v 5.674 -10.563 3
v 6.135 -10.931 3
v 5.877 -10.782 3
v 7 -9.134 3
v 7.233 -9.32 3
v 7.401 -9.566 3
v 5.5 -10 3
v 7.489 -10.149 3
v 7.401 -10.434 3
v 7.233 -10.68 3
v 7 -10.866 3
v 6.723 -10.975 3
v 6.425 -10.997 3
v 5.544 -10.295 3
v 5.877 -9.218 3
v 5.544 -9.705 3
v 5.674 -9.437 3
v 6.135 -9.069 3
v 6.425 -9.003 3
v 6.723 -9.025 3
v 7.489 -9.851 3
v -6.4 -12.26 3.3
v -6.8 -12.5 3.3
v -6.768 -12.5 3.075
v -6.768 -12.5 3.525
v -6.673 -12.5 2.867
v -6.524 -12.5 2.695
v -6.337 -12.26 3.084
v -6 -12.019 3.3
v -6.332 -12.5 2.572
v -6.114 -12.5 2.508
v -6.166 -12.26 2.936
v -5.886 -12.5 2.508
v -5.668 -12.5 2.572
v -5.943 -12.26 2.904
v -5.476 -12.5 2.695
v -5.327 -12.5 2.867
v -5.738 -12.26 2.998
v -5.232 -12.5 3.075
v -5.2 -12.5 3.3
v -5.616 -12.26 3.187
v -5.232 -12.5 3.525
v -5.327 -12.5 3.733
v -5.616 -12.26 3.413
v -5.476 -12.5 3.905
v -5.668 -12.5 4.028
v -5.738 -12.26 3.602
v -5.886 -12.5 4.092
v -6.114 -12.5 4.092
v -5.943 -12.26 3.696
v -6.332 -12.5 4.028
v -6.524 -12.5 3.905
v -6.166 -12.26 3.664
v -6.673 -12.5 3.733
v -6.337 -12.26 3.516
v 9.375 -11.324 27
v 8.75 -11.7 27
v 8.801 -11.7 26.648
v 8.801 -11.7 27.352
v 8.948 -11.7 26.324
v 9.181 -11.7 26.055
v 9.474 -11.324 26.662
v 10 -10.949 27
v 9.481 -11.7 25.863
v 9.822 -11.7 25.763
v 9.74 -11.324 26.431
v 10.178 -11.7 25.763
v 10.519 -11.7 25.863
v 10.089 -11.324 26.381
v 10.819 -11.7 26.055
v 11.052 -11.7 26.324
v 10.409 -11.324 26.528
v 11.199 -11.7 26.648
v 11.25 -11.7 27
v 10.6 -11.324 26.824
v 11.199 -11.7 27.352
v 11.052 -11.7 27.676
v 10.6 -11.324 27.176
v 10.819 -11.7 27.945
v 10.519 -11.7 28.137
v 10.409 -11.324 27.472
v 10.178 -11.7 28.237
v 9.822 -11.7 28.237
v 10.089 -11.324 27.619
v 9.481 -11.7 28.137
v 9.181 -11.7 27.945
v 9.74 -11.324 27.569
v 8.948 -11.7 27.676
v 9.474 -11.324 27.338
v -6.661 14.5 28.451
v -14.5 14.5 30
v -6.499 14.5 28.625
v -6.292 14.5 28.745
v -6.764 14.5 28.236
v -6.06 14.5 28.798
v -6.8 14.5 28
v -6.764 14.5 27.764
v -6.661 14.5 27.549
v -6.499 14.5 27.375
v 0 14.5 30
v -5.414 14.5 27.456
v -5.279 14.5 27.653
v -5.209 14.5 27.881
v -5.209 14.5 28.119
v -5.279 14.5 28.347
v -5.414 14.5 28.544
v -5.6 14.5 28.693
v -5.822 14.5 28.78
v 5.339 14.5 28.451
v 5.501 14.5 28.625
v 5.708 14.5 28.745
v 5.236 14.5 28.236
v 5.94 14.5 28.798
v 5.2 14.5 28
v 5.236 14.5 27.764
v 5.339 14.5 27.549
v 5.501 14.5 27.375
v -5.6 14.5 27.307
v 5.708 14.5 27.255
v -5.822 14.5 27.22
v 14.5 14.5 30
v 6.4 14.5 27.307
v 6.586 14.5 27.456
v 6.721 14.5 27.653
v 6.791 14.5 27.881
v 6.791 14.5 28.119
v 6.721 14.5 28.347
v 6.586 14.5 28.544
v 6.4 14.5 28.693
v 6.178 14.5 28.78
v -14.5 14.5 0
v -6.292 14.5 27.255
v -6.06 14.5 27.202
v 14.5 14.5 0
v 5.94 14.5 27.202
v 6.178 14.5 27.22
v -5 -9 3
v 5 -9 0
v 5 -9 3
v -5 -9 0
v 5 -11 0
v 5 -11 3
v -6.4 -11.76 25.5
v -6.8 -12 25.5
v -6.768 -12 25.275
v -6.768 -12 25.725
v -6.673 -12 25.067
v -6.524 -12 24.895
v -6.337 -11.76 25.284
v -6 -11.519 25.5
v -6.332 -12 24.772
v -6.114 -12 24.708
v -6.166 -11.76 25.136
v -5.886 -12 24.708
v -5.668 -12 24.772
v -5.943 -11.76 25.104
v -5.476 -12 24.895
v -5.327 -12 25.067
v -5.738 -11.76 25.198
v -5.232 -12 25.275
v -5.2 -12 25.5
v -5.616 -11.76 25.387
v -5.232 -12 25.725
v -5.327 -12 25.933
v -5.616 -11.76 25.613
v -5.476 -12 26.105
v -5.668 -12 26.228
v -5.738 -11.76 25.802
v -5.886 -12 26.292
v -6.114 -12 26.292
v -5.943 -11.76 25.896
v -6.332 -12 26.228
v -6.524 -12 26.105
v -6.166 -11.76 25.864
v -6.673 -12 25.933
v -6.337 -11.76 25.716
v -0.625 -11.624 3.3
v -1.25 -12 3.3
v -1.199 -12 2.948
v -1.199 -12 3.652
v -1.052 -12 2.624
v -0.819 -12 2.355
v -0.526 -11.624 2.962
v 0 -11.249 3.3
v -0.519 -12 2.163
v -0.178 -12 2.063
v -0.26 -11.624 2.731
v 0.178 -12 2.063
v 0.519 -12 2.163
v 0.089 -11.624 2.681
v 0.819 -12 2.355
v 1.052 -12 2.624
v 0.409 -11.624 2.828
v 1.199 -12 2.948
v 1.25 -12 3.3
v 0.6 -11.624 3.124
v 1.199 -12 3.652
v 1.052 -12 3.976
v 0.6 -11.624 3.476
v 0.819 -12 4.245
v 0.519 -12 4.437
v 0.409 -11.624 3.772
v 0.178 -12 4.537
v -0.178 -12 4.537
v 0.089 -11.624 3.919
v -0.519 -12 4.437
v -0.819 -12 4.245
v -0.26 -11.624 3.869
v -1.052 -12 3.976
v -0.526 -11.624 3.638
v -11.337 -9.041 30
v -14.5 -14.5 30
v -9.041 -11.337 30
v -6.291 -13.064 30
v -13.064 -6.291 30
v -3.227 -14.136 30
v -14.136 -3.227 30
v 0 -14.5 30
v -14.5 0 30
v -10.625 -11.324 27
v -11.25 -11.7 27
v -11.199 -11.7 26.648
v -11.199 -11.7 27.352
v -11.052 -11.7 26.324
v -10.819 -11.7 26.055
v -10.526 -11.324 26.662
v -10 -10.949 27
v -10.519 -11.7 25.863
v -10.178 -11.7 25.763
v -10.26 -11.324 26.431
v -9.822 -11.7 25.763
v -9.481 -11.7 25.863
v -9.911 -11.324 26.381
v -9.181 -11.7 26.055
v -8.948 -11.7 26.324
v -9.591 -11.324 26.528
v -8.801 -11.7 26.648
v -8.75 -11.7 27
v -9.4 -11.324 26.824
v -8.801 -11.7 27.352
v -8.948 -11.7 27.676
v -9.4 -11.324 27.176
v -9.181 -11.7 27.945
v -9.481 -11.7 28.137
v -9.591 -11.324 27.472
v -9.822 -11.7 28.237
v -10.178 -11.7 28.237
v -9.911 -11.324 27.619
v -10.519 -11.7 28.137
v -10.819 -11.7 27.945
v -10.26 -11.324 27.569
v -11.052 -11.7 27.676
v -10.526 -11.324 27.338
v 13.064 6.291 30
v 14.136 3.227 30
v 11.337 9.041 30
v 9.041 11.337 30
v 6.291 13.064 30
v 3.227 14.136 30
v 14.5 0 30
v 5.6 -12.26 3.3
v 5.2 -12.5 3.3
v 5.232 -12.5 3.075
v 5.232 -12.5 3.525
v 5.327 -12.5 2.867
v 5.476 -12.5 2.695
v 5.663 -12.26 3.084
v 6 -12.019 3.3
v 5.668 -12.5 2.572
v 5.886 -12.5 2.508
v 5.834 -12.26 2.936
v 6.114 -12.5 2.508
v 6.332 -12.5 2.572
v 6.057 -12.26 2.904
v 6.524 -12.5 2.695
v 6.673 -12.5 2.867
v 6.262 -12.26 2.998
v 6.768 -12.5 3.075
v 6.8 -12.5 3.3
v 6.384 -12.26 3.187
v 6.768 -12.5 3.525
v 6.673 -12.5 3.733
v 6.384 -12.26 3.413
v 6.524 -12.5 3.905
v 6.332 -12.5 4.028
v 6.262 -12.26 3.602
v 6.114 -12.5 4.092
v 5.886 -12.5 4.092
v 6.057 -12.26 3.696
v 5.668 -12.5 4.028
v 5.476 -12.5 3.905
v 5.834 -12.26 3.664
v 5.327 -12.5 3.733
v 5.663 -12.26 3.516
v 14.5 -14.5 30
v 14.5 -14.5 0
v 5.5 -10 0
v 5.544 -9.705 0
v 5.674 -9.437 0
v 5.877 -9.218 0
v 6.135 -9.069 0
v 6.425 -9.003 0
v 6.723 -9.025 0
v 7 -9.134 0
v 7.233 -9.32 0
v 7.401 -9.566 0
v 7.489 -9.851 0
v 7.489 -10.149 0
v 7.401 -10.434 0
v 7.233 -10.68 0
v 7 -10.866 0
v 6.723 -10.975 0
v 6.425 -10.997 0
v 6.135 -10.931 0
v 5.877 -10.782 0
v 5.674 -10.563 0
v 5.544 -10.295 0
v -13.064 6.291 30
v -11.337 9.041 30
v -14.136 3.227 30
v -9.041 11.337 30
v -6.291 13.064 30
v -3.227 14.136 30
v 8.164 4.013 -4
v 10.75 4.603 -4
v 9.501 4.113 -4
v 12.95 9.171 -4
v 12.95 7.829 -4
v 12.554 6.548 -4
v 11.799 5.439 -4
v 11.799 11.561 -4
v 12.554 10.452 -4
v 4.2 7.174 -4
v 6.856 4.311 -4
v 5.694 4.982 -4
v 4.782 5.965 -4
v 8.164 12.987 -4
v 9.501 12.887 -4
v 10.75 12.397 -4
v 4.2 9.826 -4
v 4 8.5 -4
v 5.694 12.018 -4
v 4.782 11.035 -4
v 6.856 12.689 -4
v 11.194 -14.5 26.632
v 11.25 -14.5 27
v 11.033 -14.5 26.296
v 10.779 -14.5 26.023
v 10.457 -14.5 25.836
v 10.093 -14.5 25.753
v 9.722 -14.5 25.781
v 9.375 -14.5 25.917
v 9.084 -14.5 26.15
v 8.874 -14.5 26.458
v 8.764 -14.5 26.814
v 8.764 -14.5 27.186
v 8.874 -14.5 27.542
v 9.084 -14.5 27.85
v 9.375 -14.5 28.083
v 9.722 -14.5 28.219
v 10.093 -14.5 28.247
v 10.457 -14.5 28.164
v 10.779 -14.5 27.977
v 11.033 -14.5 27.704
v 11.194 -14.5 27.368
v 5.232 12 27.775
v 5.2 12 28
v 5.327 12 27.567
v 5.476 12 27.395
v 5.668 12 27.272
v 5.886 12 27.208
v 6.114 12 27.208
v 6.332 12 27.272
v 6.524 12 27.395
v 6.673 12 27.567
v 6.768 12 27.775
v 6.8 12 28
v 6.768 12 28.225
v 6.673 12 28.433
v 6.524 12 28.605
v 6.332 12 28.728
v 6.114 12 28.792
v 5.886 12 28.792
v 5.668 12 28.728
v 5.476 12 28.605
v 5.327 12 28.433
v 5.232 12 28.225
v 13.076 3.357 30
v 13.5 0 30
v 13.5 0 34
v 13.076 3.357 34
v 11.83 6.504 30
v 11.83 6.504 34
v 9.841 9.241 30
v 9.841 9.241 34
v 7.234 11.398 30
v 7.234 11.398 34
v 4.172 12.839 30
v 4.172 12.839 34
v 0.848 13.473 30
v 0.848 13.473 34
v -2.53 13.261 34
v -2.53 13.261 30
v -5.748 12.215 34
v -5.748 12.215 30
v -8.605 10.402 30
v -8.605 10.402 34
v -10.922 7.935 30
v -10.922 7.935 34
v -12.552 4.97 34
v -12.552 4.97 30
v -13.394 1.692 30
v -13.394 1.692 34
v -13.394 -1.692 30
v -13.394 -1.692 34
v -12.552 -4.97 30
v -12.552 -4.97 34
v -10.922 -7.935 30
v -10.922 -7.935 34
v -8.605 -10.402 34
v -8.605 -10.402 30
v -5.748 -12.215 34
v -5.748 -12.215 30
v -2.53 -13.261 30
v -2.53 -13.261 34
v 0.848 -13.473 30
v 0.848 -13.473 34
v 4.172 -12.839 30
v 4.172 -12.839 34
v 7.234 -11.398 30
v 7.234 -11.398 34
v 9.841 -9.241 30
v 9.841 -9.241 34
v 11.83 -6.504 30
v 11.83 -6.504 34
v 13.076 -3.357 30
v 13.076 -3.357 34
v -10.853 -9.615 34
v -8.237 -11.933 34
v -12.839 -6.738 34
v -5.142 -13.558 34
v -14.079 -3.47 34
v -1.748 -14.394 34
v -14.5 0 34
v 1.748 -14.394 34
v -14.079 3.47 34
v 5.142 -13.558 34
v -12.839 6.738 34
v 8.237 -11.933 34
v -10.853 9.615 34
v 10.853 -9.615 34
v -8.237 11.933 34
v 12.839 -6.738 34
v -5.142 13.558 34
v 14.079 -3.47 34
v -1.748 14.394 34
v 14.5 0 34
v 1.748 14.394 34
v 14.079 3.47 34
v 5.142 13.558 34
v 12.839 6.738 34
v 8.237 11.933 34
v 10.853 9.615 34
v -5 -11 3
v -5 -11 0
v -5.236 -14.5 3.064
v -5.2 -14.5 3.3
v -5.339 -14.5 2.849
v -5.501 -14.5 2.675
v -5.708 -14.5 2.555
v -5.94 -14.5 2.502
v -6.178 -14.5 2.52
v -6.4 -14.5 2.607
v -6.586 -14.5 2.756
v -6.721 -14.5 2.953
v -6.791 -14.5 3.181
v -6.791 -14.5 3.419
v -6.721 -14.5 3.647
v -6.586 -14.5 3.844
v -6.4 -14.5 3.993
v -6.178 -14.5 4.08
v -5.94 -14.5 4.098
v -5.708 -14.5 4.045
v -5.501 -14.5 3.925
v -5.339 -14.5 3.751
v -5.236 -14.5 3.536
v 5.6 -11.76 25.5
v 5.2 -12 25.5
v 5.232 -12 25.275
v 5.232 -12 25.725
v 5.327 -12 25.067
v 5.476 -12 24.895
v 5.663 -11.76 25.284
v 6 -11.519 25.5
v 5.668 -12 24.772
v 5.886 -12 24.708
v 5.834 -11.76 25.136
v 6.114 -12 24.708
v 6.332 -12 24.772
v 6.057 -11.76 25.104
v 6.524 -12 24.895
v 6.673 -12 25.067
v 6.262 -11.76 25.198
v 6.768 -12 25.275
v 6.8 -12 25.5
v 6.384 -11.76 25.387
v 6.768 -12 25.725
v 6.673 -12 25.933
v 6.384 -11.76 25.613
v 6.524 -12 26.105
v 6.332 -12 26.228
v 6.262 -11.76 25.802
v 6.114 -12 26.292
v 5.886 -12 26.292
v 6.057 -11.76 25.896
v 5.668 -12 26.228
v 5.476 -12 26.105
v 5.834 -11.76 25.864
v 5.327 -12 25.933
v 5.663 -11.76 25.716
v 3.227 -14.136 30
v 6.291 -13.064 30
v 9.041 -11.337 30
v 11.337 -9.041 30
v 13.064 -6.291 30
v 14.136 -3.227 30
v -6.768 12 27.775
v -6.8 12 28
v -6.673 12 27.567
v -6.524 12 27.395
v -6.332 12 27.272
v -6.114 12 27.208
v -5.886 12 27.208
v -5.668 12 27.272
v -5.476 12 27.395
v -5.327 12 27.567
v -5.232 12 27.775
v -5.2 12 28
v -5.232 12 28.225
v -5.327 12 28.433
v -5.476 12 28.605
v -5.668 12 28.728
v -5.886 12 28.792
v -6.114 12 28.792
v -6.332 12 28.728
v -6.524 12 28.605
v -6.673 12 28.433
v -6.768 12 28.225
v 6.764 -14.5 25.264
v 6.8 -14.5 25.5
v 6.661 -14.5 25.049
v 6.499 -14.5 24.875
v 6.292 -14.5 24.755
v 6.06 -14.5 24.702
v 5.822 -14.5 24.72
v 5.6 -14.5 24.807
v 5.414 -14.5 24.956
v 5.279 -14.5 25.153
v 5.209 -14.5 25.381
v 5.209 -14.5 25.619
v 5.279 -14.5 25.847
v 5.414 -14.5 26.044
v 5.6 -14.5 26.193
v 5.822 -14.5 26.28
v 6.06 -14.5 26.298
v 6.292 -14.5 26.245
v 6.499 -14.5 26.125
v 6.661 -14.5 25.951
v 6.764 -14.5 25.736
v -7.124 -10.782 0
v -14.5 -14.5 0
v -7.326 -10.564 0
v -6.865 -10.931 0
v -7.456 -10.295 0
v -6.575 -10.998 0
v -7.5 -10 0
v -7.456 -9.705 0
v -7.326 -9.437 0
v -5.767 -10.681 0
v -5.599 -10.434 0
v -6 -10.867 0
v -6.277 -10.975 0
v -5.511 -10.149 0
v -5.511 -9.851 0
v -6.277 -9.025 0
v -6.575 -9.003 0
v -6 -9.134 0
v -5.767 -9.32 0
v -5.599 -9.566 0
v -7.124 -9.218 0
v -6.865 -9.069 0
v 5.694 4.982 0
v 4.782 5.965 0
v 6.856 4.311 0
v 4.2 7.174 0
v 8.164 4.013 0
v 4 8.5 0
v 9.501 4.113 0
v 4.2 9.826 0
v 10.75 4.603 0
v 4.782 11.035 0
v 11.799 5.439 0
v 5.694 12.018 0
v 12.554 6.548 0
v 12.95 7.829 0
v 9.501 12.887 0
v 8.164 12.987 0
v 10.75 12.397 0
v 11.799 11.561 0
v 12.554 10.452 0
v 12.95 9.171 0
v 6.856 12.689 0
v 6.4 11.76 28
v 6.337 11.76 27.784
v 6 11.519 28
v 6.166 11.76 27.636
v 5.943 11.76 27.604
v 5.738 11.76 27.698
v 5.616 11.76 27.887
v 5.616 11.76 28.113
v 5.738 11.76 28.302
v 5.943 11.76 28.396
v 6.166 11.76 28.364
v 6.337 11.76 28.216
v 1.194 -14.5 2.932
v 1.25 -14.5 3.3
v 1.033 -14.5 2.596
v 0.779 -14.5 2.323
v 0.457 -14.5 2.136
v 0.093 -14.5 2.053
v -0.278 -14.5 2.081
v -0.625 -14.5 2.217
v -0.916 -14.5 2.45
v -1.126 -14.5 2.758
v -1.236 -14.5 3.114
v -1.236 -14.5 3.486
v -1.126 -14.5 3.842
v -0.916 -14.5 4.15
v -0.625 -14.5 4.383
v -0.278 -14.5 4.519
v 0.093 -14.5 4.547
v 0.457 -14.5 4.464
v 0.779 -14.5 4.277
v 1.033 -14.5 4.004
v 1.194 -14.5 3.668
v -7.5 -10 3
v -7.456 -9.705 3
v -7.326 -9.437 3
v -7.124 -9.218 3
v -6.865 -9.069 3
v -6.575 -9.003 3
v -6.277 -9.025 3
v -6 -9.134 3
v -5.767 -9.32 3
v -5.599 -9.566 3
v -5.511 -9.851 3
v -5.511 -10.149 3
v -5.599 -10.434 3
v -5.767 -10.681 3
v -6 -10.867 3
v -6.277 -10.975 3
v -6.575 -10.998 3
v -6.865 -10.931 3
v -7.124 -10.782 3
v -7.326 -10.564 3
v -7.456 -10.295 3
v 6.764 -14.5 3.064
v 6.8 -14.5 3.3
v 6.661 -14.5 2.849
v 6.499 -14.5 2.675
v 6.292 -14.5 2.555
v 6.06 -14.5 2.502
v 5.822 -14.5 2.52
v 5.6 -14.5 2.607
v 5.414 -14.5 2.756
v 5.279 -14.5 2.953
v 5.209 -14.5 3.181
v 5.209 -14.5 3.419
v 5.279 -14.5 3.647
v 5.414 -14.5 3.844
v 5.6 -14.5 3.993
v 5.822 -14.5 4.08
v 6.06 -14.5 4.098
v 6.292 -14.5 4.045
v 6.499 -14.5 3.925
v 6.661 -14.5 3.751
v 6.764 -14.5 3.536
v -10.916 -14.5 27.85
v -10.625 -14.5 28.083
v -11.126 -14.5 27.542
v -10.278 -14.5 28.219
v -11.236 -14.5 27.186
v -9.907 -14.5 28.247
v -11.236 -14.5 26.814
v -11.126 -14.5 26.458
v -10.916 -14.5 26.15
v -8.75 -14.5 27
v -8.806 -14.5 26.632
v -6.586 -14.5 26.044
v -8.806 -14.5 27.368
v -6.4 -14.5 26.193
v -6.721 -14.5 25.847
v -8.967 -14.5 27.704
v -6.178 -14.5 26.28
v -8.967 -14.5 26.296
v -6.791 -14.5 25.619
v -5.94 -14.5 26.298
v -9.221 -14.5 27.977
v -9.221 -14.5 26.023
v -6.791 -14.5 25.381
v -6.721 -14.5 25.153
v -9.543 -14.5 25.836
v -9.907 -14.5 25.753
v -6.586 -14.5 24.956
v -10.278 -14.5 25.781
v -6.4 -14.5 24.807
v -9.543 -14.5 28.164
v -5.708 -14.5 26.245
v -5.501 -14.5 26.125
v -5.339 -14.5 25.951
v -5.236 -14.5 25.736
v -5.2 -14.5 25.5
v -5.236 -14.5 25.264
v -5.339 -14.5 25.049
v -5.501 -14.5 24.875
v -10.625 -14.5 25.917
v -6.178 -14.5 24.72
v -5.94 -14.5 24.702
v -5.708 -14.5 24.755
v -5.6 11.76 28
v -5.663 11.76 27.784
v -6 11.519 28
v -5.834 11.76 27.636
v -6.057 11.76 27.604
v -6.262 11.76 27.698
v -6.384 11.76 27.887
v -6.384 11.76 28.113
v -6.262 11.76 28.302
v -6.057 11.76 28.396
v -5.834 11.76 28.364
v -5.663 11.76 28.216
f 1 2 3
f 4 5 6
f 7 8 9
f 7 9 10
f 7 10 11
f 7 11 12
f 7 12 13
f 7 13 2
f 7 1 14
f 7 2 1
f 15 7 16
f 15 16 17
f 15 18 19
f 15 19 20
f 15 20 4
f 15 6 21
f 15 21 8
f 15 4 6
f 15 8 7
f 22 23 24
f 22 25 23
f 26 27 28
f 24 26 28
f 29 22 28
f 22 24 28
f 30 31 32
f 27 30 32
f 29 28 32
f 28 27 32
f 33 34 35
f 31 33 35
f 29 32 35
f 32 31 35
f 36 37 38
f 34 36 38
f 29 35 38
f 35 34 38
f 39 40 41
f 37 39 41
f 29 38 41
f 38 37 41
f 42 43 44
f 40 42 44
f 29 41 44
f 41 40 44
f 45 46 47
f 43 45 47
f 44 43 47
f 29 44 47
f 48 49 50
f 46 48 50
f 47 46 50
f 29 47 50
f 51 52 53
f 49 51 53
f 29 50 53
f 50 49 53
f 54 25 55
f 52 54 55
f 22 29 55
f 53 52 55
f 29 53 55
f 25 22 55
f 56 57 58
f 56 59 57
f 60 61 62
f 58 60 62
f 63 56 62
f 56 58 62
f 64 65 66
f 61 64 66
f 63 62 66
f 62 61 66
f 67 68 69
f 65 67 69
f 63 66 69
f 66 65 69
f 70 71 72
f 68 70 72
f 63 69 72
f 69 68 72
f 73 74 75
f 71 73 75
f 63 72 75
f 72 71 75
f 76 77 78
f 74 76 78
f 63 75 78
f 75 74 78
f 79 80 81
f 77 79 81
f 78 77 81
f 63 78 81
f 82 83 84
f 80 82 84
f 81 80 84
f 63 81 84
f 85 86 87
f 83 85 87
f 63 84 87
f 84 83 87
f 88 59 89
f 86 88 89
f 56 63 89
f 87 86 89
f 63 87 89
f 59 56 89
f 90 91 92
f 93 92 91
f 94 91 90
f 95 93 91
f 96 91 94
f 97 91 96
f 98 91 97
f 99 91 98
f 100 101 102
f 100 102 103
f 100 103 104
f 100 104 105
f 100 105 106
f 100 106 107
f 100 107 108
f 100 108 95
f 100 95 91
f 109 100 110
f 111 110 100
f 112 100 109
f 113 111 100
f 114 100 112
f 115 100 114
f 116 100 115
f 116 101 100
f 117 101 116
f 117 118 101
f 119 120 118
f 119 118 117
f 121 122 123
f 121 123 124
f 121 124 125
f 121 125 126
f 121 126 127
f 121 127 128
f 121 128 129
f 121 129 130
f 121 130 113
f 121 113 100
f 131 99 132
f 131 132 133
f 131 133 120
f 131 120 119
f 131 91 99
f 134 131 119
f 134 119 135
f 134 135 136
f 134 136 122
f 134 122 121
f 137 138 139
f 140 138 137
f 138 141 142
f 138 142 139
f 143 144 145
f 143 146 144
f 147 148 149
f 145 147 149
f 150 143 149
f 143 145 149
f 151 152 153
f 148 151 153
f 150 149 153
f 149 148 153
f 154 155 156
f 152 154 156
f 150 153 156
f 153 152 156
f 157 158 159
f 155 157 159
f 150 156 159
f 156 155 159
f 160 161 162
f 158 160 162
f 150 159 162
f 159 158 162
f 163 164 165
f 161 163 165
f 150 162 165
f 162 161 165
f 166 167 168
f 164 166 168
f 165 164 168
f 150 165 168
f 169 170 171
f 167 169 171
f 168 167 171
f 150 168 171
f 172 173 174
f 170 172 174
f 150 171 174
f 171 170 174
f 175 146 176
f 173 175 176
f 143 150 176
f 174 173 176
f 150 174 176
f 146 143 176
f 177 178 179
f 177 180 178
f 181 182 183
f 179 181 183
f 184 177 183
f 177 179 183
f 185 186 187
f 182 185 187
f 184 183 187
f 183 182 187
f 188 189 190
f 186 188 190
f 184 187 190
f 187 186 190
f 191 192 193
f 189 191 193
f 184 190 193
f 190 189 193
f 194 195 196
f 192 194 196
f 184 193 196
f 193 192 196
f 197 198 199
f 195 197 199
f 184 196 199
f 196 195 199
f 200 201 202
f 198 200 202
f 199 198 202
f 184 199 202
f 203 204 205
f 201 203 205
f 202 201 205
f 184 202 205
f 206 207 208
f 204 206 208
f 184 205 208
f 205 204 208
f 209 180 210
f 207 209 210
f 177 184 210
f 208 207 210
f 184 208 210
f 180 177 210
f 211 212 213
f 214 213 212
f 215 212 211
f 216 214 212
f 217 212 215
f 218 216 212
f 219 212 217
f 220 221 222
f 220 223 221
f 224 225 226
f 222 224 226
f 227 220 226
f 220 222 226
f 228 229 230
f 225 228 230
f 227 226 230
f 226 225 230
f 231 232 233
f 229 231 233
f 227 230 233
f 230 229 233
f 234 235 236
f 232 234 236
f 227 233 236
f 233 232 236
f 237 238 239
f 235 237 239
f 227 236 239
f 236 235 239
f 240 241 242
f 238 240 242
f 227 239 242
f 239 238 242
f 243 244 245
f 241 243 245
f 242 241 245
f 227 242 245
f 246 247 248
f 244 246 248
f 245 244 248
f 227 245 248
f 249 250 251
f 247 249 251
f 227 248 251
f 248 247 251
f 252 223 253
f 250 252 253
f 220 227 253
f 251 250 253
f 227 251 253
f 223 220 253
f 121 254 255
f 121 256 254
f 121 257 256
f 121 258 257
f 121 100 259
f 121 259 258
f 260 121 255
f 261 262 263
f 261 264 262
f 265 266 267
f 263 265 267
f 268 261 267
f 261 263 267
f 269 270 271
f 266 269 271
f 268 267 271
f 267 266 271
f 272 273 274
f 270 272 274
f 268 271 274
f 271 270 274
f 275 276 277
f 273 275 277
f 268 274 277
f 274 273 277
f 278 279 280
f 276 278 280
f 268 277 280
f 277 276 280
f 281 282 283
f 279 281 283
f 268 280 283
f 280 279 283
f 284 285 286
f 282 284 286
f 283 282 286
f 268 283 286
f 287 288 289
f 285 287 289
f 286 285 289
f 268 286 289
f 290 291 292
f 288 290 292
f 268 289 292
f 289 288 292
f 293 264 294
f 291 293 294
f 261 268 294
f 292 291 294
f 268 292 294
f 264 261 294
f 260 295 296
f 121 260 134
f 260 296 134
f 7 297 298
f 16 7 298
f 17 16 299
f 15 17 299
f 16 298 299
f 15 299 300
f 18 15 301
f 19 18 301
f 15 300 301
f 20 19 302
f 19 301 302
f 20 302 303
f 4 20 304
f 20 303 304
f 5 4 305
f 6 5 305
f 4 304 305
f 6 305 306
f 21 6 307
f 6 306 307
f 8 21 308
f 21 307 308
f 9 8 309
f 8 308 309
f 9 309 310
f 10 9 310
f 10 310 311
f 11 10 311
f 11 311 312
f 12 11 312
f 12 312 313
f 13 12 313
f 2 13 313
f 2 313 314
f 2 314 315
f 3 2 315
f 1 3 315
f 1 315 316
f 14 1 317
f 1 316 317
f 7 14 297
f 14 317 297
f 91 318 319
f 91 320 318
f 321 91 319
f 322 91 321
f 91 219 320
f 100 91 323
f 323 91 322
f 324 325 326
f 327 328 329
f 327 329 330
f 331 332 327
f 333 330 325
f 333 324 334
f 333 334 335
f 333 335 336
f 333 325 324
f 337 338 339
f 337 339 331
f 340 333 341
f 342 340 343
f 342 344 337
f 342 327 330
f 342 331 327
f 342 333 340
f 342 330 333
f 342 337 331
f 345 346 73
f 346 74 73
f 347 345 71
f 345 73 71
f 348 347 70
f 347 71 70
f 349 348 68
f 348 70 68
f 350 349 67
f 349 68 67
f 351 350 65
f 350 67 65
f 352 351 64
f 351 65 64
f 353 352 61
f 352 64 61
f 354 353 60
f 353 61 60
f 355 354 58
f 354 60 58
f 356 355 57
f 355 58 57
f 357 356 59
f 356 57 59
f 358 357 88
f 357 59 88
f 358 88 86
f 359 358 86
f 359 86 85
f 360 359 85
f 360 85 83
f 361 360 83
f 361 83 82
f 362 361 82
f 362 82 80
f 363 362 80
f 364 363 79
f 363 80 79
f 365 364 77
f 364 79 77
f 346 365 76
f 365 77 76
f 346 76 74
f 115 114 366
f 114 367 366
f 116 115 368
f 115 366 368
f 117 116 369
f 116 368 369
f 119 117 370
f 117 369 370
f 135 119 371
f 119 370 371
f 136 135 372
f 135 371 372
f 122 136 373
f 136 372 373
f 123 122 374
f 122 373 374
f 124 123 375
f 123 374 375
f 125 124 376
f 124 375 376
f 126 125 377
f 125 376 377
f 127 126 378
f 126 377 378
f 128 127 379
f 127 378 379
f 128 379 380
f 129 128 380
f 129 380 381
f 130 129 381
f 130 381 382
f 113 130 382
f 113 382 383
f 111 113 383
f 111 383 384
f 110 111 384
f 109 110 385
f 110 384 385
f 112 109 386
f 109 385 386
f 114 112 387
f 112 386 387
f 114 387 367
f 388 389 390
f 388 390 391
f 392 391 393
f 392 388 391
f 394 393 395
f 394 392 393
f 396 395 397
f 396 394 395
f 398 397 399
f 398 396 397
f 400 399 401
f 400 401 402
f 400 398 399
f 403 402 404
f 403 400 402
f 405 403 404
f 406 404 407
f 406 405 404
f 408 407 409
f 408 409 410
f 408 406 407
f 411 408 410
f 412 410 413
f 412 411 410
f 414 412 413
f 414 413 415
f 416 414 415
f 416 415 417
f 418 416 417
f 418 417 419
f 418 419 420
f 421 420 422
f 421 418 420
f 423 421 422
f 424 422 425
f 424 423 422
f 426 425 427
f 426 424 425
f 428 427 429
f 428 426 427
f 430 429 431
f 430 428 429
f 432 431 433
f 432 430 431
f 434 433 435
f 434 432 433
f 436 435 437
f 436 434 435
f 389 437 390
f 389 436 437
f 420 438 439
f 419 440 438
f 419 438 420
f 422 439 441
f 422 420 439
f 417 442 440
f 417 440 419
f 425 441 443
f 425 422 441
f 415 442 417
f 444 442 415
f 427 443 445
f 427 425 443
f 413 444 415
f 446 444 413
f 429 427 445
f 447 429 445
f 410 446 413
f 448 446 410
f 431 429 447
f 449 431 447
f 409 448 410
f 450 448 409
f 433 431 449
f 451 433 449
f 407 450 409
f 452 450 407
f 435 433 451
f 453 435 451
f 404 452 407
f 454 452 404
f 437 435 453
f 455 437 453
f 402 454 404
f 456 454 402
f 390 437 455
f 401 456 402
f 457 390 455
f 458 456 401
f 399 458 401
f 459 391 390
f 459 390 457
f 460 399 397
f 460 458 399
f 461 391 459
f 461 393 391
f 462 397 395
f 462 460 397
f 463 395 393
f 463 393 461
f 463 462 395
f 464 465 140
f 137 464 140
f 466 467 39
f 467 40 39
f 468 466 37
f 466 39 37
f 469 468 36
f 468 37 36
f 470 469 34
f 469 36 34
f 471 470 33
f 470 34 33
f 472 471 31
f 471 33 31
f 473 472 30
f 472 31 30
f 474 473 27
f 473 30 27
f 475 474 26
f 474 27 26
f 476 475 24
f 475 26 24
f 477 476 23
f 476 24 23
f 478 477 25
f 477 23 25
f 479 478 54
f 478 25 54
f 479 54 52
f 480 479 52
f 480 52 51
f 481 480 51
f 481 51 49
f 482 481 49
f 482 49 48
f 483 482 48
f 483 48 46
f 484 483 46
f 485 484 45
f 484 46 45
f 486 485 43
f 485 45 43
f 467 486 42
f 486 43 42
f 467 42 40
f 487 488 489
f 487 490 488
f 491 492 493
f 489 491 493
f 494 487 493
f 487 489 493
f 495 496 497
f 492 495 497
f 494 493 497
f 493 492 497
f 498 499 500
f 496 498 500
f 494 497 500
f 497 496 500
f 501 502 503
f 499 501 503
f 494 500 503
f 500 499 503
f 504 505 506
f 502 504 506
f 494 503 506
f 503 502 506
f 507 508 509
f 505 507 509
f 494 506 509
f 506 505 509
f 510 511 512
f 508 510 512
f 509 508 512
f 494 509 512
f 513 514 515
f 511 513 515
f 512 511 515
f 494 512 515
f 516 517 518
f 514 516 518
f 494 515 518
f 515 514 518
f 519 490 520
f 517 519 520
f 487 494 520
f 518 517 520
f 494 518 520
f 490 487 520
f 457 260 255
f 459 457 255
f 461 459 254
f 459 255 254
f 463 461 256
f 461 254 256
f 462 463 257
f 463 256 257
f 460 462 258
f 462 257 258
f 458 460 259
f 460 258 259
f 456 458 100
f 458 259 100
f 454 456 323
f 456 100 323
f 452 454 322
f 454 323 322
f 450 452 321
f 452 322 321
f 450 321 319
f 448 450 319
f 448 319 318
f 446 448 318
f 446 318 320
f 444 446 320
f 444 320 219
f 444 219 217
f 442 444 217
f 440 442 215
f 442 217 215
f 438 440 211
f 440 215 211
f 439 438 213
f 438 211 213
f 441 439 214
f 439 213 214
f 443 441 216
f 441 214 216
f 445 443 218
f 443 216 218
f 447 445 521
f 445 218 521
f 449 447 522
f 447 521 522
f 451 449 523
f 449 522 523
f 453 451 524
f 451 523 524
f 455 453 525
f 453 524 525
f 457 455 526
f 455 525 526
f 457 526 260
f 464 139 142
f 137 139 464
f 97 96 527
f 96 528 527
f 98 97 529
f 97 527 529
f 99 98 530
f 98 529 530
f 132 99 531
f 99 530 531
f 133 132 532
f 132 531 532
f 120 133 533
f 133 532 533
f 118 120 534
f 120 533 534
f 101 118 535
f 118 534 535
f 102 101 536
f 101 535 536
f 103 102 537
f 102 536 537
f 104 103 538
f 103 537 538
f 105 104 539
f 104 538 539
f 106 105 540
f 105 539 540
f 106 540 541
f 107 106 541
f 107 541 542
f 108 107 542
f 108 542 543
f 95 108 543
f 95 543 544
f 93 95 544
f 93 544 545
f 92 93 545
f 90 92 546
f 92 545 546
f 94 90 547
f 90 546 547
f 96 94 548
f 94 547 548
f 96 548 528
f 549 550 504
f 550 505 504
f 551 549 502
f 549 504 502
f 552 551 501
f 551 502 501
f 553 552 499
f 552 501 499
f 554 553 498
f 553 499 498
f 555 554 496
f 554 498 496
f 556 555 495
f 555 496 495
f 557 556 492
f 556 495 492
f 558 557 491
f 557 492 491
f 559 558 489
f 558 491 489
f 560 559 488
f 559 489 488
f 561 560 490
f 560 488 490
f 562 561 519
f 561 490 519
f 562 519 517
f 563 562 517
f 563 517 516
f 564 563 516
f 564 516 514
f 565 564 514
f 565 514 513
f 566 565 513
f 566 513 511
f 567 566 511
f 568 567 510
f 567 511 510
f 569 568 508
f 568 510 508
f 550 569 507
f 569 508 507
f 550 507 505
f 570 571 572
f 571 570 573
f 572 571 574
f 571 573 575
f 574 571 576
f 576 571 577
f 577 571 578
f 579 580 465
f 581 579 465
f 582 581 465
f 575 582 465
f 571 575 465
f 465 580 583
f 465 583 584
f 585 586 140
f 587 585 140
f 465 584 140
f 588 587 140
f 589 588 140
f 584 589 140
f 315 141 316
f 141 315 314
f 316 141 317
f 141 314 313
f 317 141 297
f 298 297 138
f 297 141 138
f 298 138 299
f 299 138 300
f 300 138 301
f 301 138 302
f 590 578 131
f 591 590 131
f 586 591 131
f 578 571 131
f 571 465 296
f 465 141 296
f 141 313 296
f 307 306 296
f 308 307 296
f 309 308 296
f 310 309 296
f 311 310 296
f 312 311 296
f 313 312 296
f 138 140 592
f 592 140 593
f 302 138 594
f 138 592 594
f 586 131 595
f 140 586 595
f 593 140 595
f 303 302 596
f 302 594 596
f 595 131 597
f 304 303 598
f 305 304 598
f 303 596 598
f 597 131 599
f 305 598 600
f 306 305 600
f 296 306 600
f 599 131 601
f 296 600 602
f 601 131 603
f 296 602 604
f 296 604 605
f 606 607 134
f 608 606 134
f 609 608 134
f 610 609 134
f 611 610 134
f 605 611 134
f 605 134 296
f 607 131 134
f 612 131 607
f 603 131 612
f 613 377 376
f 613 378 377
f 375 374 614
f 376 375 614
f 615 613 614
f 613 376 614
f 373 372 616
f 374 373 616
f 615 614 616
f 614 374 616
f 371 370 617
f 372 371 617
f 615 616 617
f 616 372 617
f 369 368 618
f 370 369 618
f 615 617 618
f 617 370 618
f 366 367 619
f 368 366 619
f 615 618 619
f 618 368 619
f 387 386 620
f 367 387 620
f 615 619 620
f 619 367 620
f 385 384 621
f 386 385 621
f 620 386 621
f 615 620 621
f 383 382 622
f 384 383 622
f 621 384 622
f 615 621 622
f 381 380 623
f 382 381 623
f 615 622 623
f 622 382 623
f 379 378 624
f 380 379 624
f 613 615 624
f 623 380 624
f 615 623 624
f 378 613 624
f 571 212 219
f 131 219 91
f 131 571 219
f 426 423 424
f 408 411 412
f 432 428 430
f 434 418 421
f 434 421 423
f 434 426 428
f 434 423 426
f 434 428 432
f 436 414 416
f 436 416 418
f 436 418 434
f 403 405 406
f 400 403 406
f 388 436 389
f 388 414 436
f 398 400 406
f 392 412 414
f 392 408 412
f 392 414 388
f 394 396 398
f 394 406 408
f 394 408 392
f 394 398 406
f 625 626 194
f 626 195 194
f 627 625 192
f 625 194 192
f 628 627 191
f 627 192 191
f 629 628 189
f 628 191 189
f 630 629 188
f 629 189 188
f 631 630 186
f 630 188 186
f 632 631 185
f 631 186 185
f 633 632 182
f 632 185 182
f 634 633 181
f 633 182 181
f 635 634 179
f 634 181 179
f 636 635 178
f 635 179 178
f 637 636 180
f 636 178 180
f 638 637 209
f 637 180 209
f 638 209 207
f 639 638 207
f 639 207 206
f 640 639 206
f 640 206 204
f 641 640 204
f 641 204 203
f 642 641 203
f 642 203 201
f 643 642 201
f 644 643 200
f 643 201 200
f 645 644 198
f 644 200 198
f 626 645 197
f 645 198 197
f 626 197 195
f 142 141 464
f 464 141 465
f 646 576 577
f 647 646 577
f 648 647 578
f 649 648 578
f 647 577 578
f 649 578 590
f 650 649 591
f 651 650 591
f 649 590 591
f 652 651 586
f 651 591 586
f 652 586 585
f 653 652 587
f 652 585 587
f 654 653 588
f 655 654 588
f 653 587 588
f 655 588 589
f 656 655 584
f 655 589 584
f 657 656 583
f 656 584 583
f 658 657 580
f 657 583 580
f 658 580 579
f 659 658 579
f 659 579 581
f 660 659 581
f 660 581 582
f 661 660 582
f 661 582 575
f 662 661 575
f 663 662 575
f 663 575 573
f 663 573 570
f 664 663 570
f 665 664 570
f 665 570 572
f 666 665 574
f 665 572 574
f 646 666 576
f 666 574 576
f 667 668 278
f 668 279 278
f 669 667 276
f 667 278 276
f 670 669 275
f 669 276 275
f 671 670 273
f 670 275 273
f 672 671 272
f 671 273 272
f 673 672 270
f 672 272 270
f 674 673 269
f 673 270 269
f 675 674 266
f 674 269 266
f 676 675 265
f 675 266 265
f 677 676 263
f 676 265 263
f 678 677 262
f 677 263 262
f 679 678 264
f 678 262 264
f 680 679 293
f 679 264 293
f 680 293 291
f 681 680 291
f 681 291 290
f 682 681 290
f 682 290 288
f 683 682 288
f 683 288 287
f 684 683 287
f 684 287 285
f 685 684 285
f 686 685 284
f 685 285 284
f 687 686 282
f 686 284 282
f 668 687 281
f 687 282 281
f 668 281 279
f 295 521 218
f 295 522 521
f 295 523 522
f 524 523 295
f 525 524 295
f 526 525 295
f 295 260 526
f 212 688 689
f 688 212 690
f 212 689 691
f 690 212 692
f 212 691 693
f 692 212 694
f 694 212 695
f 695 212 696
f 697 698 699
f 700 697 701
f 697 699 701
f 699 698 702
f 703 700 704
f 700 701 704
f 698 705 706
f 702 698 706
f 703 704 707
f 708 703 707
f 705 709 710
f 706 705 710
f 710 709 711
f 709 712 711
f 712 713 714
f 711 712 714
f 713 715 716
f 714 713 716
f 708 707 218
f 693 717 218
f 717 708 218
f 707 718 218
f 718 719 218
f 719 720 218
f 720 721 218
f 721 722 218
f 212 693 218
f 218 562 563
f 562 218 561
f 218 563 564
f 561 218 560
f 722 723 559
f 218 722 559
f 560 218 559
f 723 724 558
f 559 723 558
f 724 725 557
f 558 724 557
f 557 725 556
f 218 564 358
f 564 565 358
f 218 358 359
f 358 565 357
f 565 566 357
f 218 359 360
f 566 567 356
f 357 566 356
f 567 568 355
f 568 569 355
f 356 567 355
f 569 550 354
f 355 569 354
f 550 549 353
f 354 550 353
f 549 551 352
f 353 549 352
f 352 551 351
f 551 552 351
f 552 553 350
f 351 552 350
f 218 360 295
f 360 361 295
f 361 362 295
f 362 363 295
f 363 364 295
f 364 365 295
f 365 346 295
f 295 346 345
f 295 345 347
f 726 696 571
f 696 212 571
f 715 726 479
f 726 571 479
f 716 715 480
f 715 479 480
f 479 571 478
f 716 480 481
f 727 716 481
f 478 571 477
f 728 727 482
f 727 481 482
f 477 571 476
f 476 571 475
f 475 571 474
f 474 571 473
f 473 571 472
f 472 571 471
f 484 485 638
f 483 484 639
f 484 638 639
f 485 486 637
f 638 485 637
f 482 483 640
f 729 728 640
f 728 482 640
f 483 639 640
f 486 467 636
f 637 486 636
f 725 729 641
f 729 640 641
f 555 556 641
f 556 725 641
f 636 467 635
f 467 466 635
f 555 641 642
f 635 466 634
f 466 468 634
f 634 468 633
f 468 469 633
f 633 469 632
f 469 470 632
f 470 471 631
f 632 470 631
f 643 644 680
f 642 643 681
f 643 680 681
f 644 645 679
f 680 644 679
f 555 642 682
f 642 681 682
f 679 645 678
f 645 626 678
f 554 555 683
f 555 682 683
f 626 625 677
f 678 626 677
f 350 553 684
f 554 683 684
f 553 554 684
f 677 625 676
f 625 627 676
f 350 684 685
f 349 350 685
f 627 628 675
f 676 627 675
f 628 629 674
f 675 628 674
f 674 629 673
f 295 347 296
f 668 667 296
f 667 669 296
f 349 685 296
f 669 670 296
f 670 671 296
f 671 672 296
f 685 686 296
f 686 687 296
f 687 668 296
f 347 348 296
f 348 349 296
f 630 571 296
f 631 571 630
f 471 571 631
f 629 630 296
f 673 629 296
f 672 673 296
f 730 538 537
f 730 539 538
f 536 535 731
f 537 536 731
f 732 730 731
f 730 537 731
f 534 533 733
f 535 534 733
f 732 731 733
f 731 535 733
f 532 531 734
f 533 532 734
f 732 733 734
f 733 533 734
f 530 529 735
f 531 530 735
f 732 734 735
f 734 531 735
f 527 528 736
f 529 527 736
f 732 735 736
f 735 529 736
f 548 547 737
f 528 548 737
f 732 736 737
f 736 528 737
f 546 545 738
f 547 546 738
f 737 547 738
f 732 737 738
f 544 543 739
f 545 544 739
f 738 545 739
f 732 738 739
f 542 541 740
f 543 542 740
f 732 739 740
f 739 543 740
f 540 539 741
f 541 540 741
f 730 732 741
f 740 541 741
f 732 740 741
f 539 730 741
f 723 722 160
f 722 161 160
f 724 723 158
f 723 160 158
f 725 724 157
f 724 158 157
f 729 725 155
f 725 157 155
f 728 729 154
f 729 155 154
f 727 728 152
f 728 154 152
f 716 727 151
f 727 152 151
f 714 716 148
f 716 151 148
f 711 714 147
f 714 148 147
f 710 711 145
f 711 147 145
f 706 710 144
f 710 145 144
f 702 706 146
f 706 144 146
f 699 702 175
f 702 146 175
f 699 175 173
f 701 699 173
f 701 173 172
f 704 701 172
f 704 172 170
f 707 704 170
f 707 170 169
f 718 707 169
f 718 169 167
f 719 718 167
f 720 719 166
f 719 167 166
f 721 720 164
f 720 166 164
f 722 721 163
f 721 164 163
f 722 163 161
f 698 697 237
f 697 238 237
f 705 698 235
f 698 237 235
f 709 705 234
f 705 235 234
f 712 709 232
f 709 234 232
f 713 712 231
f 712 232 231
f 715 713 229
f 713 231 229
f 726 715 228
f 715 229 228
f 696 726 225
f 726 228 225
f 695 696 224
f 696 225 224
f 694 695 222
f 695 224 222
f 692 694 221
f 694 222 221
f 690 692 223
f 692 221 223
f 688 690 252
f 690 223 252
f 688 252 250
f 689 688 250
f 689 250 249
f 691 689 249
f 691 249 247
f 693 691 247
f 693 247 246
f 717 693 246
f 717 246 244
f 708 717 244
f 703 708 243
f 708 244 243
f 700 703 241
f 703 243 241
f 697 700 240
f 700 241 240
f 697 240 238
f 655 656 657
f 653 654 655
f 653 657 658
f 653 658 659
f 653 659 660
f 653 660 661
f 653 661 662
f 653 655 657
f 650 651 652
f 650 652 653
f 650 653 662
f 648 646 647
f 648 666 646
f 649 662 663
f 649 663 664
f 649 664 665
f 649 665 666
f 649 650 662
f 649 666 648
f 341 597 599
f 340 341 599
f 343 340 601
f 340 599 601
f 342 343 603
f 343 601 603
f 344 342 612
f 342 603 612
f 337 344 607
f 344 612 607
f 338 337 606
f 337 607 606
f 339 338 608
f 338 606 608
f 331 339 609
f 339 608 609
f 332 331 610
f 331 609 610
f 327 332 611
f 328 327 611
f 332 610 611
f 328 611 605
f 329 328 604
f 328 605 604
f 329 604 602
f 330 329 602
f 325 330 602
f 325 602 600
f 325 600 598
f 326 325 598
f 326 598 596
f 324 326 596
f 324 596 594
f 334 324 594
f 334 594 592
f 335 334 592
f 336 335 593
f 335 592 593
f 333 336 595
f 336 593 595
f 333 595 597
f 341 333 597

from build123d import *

# Parameters (mm, degrees)
SKETCH1_W                 = 29
SKETCH1_H                 = 29
BOSS_EXTRUDE1_DEPTH       = 30
M2X0_4_TAPPED_HOLE1_D     = 1.6
M2X0_4_TAPPED_HOLE1_DEPTH = 2.5
M2X0_4_TAPPED_HOLE1_TIP   = 0.480688495
M3X0_5_TAPPED_HOLE1_D     = 2.5
M3X0_5_TAPPED_HOLE1_DEPTH = 2.8
M3X0_5_TAPPED_HOLE1_TIP   = 0.751075774
M3X0_5_TAPPED_HOLE2_D     = 2.5
M3X0_5_TAPPED_HOLE2_DEPTH = 2.5
M3X0_5_TAPPED_HOLE2_TIP   = 0.751075774
M2X0_4_TAPPED_HOLE2_D     = 1.6
M2X0_4_TAPPED_HOLE2_DEPTH = 2.5
M2X0_4_TAPPED_HOLE2_TIP   = 0.480688495
M2X0_4_TAPPED_HOLE3_D     = 1.6
M2X0_4_TAPPED_HOLE3_DEPTH = 2
M2X0_4_TAPPED_HOLE3_TIP   = 0.480688495
SKETCH12_R                = 1.000276531
SKETCH12_R_2              = 1
SKETCH12_W                = 10
SKETCH12_H                = 2
CUT_EXTRUDE4_DEPTH        = 3
SKETCH13_R                = 4.5
BOSS_EXTRUDE2_DEPTH       = 4
SKETCH14_R                = 14.5
SKETCH14_R_2              = 13.5
BOSS_EXTRUDE3_DEPTH       = 4


with BuildPart() as part:
    # Sketch1 → Boss-Extrude1 (new body)
    with BuildSketch(Plane.XY):
        Rectangle(SKETCH1_W, SKETCH1_H)
    extrude(amount=BOSS_EXTRUDE1_DEPTH)

    # M2x0.4 Tapped Hole1
    with Locations(Plane(origin=(0, 14.5, 0), x_dir=(1, 0, 0), z_dir=(0, 1, 0))):
        with Locations((-6, -28), (6, -28)):
            Hole(M2X0_4_TAPPED_HOLE1_D / 2, depth=M2X0_4_TAPPED_HOLE1_DEPTH)
            with Locations((0, 0, -(M2X0_4_TAPPED_HOLE1_DEPTH + M2X0_4_TAPPED_HOLE1_TIP / 2))):  # 118° drill point
                Cone(0, M2X0_4_TAPPED_HOLE1_D / 2, M2X0_4_TAPPED_HOLE1_TIP, mode=Mode.SUBTRACT)

    # M3x0.5 Tapped Hole1
    with Locations(Plane(origin=(0, -14.5, 0), x_dir=(-1, 0, 0), z_dir=(0, -1, 0))):
        with Locations((-10, -27), (10, -27)):
            Hole(M3X0_5_TAPPED_HOLE1_D / 2, depth=M3X0_5_TAPPED_HOLE1_DEPTH)
            with Locations((0, 0, -(M3X0_5_TAPPED_HOLE1_DEPTH + M3X0_5_TAPPED_HOLE1_TIP / 2))):  # 118° drill point
                Cone(0, M3X0_5_TAPPED_HOLE1_D / 2, M3X0_5_TAPPED_HOLE1_TIP, mode=Mode.SUBTRACT)

    # M3x0.5 Tapped Hole2
    with Locations(Plane(origin=(0, -14.5, 0), x_dir=(-1, 0, 0), z_dir=(0, -1, 0))):
        with Locations((0, -3.3)):
            Hole(M3X0_5_TAPPED_HOLE2_D / 2, depth=M3X0_5_TAPPED_HOLE2_DEPTH)
            with Locations((0, 0, -(M3X0_5_TAPPED_HOLE2_DEPTH + M3X0_5_TAPPED_HOLE2_TIP / 2))):  # 118° drill point
                Cone(0, M3X0_5_TAPPED_HOLE2_D / 2, M3X0_5_TAPPED_HOLE2_TIP, mode=Mode.SUBTRACT)

    # M2x0.4 Tapped Hole2
    with Locations(Plane(origin=(0, -14.5, 0), x_dir=(-1, 0, 0), z_dir=(0, -1, 0))):
        with Locations((-6, -25.5), (6, -25.5)):
            Hole(M2X0_4_TAPPED_HOLE2_D / 2, depth=M2X0_4_TAPPED_HOLE2_DEPTH)
            with Locations((0, 0, -(M2X0_4_TAPPED_HOLE2_DEPTH + M2X0_4_TAPPED_HOLE2_TIP / 2))):  # 118° drill point
                Cone(0, M2X0_4_TAPPED_HOLE2_D / 2, M2X0_4_TAPPED_HOLE2_TIP, mode=Mode.SUBTRACT)

    # M2x0.4 Tapped Hole3
    with Locations(Plane(origin=(0, -14.5, 0), x_dir=(-1, 0, 0), z_dir=(0, -1, 0))):
        with Locations((-6, -3.3), (6, -3.3)):
            Hole(M2X0_4_TAPPED_HOLE3_D / 2, depth=M2X0_4_TAPPED_HOLE3_DEPTH)
            with Locations((0, 0, -(M2X0_4_TAPPED_HOLE3_DEPTH + M2X0_4_TAPPED_HOLE3_TIP / 2))):  # 118° drill point
                Cone(0, M2X0_4_TAPPED_HOLE3_D / 2, M2X0_4_TAPPED_HOLE3_TIP, mode=Mode.SUBTRACT)

    # Sketch12 → Cut-Extrude4 (cut)
    with BuildSketch(Plane(origin=(0, 0, 0), x_dir=(-1, 0, 0), z_dir=(0, 0, -1))):
        with Locations((6.5, -10.000276531)):
            Circle(SKETCH12_R)
        with Locations((-6.5, -10)):
            Circle(SKETCH12_R_2)
        with Locations((0, -10)):
            Rectangle(SKETCH12_W, SKETCH12_H)
    extrude(amount=-CUT_EXTRUDE4_DEPTH, mode=Mode.SUBTRACT)

    # Sketch13 → Boss-Extrude2 (add)
    with BuildSketch(Plane(origin=(0, 0, 0), x_dir=(-1, 0, 0), z_dir=(0, 0, -1))):
        with Locations((-8.5, 8.5)):
            Circle(SKETCH13_R)
    extrude(amount=BOSS_EXTRUDE2_DEPTH)

    # Sketch14 → Boss-Extrude3 (add)
    with BuildSketch(Plane.XY.offset(30)):
        Circle(SKETCH14_R)
        Circle(SKETCH14_R_2, mode=Mode.SUBTRACT)
    extrude(amount=BOSS_EXTRUDE3_DEPTH)


solid = part.part
